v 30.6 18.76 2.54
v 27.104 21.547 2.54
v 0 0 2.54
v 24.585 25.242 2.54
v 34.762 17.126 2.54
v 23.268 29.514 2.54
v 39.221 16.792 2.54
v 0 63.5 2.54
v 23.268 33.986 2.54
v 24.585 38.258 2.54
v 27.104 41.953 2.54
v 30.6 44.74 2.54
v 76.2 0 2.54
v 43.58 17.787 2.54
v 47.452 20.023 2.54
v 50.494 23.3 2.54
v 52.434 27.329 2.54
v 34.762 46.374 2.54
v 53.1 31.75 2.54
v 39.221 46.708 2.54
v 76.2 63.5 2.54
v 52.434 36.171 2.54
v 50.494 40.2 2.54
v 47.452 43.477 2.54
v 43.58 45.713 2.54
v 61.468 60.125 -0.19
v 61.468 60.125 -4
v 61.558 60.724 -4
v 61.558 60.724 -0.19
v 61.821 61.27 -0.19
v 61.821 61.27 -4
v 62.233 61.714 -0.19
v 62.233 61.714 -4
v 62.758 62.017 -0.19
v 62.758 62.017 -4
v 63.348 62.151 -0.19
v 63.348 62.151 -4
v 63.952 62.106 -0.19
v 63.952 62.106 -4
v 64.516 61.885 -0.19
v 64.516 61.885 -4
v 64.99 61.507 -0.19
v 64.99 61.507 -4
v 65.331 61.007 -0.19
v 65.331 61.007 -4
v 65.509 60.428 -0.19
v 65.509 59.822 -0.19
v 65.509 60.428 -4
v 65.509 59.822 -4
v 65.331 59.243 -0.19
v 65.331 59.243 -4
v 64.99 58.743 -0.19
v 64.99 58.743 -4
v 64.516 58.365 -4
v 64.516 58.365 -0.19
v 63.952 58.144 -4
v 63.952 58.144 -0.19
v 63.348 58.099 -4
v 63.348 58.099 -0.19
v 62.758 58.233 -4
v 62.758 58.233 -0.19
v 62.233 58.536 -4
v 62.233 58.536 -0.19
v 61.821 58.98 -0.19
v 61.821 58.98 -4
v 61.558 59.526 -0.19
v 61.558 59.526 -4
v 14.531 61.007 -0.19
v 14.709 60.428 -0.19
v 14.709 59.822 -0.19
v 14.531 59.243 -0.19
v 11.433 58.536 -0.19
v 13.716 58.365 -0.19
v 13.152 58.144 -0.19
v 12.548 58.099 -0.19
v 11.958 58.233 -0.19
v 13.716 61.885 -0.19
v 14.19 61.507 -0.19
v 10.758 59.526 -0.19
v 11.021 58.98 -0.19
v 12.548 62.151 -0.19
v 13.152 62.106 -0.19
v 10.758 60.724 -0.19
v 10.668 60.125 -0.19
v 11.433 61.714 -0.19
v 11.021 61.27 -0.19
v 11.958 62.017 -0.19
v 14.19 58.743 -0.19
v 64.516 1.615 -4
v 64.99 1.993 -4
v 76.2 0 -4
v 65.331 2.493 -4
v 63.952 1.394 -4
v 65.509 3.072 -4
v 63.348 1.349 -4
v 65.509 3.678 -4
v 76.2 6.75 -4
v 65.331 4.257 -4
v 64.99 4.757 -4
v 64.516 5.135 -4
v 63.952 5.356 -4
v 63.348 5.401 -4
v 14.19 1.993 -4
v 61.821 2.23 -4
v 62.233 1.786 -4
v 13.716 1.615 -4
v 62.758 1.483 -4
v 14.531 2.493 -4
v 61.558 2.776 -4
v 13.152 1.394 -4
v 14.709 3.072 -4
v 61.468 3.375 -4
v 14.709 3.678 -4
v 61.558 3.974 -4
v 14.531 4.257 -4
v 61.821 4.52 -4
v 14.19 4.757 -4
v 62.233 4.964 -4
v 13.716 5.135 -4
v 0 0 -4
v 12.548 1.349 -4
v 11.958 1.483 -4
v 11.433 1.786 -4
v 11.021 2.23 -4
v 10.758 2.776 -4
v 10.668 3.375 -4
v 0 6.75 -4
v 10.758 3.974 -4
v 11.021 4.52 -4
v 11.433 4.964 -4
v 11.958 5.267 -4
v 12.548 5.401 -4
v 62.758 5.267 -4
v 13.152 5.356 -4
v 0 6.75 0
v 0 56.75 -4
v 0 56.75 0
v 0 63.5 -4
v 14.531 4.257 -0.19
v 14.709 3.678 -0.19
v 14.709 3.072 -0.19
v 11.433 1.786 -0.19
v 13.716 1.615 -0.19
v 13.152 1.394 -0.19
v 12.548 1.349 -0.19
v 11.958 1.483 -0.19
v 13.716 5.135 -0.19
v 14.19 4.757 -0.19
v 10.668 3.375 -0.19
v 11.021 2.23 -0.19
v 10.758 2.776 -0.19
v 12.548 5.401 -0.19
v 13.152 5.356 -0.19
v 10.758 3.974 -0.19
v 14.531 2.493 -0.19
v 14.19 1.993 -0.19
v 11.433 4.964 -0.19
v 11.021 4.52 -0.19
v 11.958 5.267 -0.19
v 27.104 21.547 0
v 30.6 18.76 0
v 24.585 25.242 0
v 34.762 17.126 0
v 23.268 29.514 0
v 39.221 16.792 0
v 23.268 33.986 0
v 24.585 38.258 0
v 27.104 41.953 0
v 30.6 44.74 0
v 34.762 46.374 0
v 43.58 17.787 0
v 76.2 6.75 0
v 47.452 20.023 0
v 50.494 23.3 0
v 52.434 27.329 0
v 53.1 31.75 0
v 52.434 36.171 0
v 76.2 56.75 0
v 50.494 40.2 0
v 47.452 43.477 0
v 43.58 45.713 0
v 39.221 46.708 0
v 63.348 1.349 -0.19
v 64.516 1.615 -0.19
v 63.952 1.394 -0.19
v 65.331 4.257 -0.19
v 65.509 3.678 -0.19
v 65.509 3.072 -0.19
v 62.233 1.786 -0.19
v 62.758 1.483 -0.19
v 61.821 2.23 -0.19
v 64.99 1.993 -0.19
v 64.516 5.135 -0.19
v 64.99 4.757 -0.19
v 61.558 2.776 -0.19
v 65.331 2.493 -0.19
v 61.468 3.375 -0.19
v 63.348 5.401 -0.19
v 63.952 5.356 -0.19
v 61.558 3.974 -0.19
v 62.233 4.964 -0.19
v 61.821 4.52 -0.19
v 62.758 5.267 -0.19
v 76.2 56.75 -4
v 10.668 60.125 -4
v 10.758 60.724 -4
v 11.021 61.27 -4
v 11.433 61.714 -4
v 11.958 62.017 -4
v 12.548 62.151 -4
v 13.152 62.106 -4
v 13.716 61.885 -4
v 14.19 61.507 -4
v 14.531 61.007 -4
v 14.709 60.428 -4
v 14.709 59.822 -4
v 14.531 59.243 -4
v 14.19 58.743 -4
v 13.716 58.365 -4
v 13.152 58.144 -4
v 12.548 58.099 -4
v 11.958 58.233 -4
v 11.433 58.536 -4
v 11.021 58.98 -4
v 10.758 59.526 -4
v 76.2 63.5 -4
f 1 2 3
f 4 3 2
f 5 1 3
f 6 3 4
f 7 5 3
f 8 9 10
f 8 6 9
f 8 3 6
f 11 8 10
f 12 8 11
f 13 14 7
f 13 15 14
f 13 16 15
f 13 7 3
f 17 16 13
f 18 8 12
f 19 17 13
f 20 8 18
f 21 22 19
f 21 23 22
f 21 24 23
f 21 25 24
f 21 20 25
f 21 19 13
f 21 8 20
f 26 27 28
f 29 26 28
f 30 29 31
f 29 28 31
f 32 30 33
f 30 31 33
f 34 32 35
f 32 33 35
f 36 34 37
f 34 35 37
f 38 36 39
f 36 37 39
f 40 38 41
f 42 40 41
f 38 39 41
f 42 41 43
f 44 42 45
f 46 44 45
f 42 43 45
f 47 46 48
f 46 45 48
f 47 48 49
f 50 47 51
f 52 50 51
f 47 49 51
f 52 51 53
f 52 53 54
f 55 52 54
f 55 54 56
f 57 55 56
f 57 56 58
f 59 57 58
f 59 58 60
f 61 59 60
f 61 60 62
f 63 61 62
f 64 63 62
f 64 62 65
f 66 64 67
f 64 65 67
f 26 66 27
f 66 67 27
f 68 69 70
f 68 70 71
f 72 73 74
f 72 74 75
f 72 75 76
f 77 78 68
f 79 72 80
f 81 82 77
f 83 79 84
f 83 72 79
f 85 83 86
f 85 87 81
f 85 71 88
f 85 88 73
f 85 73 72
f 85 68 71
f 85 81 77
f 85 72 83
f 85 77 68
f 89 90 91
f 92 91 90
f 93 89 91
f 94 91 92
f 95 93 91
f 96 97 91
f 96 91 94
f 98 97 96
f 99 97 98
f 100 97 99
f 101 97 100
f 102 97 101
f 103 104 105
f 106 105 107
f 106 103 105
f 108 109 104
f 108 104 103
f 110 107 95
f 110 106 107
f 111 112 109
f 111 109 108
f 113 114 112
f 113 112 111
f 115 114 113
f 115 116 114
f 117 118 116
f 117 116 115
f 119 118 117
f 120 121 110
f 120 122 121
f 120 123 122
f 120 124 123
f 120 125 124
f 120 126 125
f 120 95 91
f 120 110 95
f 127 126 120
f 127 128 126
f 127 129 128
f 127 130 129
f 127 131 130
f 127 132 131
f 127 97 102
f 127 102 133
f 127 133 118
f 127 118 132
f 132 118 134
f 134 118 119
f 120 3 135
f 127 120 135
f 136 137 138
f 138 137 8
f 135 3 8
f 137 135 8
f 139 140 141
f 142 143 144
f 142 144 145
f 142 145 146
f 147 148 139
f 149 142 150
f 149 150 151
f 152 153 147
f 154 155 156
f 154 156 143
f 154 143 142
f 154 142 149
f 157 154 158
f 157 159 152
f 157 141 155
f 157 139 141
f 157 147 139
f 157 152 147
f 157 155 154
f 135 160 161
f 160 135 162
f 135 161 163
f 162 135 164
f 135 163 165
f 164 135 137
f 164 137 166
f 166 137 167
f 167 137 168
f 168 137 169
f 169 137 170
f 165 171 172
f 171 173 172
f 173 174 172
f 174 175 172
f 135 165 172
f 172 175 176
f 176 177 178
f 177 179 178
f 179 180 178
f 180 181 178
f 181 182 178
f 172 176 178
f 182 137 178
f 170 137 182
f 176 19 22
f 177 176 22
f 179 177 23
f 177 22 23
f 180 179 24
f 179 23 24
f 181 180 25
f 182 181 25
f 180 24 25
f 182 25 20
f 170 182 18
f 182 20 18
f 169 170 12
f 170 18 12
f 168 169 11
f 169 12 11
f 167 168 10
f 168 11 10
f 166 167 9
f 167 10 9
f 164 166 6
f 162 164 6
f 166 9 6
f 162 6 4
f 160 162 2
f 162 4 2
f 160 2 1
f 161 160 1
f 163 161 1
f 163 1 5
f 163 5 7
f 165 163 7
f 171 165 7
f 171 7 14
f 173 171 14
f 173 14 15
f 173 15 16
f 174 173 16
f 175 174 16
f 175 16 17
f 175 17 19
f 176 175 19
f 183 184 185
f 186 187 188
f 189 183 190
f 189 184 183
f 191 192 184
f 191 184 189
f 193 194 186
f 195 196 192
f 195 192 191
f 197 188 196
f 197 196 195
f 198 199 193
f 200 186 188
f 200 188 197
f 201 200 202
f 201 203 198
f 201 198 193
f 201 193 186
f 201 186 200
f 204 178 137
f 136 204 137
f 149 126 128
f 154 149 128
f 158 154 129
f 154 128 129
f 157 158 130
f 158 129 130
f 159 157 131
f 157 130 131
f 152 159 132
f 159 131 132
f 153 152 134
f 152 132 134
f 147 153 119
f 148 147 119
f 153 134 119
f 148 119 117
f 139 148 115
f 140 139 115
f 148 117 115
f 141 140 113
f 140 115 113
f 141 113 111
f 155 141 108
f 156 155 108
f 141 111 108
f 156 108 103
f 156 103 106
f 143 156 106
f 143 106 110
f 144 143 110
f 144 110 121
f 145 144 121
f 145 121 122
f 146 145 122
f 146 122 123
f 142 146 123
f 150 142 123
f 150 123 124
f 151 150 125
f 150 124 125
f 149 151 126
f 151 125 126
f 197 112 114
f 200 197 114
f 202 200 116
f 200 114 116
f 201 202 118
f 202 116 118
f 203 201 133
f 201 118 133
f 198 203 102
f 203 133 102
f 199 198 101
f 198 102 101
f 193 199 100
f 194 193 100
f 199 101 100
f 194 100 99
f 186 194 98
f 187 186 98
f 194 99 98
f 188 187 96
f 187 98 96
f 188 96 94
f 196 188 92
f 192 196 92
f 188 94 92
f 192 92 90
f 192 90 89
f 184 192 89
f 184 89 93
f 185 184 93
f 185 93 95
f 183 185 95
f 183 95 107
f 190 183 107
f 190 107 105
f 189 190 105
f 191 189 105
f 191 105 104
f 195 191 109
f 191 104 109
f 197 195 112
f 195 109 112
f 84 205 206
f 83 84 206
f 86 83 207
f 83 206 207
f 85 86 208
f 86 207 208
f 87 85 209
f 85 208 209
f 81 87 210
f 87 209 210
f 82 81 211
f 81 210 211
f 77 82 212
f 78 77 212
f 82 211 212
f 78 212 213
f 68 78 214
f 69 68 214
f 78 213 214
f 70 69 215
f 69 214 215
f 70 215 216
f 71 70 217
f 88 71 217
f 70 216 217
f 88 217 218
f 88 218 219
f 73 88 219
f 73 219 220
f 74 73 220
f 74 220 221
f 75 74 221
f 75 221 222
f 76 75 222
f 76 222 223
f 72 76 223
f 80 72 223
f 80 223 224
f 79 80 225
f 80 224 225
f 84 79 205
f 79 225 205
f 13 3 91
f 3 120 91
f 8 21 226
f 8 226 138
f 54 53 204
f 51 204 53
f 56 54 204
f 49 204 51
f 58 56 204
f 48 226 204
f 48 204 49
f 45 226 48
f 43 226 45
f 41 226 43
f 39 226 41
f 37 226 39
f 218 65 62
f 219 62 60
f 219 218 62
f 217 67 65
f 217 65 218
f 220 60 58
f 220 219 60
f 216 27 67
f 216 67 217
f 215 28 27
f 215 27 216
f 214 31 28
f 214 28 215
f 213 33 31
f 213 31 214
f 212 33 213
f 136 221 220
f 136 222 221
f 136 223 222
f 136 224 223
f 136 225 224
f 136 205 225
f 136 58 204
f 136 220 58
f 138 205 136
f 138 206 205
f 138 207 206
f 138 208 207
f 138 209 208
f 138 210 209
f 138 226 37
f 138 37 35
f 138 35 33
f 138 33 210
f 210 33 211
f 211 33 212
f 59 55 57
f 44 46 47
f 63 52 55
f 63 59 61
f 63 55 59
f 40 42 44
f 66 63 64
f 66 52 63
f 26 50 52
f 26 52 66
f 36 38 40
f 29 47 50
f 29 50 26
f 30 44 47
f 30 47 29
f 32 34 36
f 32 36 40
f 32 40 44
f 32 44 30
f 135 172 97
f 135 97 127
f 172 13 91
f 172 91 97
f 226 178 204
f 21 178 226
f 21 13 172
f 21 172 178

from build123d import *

# Parameters (mm, degrees)
SKETCH1_W           = 76.2
SKETCH1_H           = 63.5
BOSS_EXTRUDE1_DEPTH = 2.54
SKETCH2_W           = 76.2
SKETCH2_H           = 6.75
BOSS_EXTRUDE2_DEPTH = 4
SKETCH3_R           = 2.032
CUT_EXTRUDE1_DEPTH  = 3.81
SKETCH4_R           = 15
CUT_EXTRUDE2_DEPTH  = 10


with BuildPart() as part:
    # Sketch1 → Boss-Extrude1 (new body)
    with BuildSketch(Plane.XY):
        with Locations((38.1, 31.75)):
            Rectangle(SKETCH1_W, SKETCH1_H)
    extrude(amount=BOSS_EXTRUDE1_DEPTH)

    # Sketch2 → Boss-Extrude2 (add)
    with BuildSketch(Plane(origin=(0, 0, 0), x_dir=(-1, 0, 0), z_dir=(0, 0, -1))):
        with Locations((-38.1, 60.125)):
            Rectangle(SKETCH2_W, SKETCH2_H)
        with Locations((-38.1, 3.375)):
            Rectangle(SKETCH2_W, SKETCH2_H)
    extrude(amount=BOSS_EXTRUDE2_DEPTH)

    # Sketch3 → Cut-Extrude1 (cut)
    with BuildSketch(Plane(origin=(0, 0, -4), x_dir=(-1, 0, 0), z_dir=(0, 0, -1))):
        with Locations((-63.5, 60.125)):
            Circle(SKETCH3_R)
        with Locations((-63.5, 3.375)):
            Circle(SKETCH3_R)
        with Locations((-12.7, 3.375)):
            Circle(SKETCH3_R)
        with Locations((-12.7, 60.125)):
            Circle(SKETCH3_R)
    extrude(amount=-CUT_EXTRUDE1_DEPTH, mode=Mode.SUBTRACT)

    # Sketch4 → Cut-Extrude2 (cut)
    with BuildSketch(Plane.XY.offset(2.54)):
        with Locations((38.1, 31.75)):
            Circle(SKETCH4_R)
    extrude(amount=-CUT_EXTRUDE2_DEPTH, mode=Mode.SUBTRACT)


solid = part.part
